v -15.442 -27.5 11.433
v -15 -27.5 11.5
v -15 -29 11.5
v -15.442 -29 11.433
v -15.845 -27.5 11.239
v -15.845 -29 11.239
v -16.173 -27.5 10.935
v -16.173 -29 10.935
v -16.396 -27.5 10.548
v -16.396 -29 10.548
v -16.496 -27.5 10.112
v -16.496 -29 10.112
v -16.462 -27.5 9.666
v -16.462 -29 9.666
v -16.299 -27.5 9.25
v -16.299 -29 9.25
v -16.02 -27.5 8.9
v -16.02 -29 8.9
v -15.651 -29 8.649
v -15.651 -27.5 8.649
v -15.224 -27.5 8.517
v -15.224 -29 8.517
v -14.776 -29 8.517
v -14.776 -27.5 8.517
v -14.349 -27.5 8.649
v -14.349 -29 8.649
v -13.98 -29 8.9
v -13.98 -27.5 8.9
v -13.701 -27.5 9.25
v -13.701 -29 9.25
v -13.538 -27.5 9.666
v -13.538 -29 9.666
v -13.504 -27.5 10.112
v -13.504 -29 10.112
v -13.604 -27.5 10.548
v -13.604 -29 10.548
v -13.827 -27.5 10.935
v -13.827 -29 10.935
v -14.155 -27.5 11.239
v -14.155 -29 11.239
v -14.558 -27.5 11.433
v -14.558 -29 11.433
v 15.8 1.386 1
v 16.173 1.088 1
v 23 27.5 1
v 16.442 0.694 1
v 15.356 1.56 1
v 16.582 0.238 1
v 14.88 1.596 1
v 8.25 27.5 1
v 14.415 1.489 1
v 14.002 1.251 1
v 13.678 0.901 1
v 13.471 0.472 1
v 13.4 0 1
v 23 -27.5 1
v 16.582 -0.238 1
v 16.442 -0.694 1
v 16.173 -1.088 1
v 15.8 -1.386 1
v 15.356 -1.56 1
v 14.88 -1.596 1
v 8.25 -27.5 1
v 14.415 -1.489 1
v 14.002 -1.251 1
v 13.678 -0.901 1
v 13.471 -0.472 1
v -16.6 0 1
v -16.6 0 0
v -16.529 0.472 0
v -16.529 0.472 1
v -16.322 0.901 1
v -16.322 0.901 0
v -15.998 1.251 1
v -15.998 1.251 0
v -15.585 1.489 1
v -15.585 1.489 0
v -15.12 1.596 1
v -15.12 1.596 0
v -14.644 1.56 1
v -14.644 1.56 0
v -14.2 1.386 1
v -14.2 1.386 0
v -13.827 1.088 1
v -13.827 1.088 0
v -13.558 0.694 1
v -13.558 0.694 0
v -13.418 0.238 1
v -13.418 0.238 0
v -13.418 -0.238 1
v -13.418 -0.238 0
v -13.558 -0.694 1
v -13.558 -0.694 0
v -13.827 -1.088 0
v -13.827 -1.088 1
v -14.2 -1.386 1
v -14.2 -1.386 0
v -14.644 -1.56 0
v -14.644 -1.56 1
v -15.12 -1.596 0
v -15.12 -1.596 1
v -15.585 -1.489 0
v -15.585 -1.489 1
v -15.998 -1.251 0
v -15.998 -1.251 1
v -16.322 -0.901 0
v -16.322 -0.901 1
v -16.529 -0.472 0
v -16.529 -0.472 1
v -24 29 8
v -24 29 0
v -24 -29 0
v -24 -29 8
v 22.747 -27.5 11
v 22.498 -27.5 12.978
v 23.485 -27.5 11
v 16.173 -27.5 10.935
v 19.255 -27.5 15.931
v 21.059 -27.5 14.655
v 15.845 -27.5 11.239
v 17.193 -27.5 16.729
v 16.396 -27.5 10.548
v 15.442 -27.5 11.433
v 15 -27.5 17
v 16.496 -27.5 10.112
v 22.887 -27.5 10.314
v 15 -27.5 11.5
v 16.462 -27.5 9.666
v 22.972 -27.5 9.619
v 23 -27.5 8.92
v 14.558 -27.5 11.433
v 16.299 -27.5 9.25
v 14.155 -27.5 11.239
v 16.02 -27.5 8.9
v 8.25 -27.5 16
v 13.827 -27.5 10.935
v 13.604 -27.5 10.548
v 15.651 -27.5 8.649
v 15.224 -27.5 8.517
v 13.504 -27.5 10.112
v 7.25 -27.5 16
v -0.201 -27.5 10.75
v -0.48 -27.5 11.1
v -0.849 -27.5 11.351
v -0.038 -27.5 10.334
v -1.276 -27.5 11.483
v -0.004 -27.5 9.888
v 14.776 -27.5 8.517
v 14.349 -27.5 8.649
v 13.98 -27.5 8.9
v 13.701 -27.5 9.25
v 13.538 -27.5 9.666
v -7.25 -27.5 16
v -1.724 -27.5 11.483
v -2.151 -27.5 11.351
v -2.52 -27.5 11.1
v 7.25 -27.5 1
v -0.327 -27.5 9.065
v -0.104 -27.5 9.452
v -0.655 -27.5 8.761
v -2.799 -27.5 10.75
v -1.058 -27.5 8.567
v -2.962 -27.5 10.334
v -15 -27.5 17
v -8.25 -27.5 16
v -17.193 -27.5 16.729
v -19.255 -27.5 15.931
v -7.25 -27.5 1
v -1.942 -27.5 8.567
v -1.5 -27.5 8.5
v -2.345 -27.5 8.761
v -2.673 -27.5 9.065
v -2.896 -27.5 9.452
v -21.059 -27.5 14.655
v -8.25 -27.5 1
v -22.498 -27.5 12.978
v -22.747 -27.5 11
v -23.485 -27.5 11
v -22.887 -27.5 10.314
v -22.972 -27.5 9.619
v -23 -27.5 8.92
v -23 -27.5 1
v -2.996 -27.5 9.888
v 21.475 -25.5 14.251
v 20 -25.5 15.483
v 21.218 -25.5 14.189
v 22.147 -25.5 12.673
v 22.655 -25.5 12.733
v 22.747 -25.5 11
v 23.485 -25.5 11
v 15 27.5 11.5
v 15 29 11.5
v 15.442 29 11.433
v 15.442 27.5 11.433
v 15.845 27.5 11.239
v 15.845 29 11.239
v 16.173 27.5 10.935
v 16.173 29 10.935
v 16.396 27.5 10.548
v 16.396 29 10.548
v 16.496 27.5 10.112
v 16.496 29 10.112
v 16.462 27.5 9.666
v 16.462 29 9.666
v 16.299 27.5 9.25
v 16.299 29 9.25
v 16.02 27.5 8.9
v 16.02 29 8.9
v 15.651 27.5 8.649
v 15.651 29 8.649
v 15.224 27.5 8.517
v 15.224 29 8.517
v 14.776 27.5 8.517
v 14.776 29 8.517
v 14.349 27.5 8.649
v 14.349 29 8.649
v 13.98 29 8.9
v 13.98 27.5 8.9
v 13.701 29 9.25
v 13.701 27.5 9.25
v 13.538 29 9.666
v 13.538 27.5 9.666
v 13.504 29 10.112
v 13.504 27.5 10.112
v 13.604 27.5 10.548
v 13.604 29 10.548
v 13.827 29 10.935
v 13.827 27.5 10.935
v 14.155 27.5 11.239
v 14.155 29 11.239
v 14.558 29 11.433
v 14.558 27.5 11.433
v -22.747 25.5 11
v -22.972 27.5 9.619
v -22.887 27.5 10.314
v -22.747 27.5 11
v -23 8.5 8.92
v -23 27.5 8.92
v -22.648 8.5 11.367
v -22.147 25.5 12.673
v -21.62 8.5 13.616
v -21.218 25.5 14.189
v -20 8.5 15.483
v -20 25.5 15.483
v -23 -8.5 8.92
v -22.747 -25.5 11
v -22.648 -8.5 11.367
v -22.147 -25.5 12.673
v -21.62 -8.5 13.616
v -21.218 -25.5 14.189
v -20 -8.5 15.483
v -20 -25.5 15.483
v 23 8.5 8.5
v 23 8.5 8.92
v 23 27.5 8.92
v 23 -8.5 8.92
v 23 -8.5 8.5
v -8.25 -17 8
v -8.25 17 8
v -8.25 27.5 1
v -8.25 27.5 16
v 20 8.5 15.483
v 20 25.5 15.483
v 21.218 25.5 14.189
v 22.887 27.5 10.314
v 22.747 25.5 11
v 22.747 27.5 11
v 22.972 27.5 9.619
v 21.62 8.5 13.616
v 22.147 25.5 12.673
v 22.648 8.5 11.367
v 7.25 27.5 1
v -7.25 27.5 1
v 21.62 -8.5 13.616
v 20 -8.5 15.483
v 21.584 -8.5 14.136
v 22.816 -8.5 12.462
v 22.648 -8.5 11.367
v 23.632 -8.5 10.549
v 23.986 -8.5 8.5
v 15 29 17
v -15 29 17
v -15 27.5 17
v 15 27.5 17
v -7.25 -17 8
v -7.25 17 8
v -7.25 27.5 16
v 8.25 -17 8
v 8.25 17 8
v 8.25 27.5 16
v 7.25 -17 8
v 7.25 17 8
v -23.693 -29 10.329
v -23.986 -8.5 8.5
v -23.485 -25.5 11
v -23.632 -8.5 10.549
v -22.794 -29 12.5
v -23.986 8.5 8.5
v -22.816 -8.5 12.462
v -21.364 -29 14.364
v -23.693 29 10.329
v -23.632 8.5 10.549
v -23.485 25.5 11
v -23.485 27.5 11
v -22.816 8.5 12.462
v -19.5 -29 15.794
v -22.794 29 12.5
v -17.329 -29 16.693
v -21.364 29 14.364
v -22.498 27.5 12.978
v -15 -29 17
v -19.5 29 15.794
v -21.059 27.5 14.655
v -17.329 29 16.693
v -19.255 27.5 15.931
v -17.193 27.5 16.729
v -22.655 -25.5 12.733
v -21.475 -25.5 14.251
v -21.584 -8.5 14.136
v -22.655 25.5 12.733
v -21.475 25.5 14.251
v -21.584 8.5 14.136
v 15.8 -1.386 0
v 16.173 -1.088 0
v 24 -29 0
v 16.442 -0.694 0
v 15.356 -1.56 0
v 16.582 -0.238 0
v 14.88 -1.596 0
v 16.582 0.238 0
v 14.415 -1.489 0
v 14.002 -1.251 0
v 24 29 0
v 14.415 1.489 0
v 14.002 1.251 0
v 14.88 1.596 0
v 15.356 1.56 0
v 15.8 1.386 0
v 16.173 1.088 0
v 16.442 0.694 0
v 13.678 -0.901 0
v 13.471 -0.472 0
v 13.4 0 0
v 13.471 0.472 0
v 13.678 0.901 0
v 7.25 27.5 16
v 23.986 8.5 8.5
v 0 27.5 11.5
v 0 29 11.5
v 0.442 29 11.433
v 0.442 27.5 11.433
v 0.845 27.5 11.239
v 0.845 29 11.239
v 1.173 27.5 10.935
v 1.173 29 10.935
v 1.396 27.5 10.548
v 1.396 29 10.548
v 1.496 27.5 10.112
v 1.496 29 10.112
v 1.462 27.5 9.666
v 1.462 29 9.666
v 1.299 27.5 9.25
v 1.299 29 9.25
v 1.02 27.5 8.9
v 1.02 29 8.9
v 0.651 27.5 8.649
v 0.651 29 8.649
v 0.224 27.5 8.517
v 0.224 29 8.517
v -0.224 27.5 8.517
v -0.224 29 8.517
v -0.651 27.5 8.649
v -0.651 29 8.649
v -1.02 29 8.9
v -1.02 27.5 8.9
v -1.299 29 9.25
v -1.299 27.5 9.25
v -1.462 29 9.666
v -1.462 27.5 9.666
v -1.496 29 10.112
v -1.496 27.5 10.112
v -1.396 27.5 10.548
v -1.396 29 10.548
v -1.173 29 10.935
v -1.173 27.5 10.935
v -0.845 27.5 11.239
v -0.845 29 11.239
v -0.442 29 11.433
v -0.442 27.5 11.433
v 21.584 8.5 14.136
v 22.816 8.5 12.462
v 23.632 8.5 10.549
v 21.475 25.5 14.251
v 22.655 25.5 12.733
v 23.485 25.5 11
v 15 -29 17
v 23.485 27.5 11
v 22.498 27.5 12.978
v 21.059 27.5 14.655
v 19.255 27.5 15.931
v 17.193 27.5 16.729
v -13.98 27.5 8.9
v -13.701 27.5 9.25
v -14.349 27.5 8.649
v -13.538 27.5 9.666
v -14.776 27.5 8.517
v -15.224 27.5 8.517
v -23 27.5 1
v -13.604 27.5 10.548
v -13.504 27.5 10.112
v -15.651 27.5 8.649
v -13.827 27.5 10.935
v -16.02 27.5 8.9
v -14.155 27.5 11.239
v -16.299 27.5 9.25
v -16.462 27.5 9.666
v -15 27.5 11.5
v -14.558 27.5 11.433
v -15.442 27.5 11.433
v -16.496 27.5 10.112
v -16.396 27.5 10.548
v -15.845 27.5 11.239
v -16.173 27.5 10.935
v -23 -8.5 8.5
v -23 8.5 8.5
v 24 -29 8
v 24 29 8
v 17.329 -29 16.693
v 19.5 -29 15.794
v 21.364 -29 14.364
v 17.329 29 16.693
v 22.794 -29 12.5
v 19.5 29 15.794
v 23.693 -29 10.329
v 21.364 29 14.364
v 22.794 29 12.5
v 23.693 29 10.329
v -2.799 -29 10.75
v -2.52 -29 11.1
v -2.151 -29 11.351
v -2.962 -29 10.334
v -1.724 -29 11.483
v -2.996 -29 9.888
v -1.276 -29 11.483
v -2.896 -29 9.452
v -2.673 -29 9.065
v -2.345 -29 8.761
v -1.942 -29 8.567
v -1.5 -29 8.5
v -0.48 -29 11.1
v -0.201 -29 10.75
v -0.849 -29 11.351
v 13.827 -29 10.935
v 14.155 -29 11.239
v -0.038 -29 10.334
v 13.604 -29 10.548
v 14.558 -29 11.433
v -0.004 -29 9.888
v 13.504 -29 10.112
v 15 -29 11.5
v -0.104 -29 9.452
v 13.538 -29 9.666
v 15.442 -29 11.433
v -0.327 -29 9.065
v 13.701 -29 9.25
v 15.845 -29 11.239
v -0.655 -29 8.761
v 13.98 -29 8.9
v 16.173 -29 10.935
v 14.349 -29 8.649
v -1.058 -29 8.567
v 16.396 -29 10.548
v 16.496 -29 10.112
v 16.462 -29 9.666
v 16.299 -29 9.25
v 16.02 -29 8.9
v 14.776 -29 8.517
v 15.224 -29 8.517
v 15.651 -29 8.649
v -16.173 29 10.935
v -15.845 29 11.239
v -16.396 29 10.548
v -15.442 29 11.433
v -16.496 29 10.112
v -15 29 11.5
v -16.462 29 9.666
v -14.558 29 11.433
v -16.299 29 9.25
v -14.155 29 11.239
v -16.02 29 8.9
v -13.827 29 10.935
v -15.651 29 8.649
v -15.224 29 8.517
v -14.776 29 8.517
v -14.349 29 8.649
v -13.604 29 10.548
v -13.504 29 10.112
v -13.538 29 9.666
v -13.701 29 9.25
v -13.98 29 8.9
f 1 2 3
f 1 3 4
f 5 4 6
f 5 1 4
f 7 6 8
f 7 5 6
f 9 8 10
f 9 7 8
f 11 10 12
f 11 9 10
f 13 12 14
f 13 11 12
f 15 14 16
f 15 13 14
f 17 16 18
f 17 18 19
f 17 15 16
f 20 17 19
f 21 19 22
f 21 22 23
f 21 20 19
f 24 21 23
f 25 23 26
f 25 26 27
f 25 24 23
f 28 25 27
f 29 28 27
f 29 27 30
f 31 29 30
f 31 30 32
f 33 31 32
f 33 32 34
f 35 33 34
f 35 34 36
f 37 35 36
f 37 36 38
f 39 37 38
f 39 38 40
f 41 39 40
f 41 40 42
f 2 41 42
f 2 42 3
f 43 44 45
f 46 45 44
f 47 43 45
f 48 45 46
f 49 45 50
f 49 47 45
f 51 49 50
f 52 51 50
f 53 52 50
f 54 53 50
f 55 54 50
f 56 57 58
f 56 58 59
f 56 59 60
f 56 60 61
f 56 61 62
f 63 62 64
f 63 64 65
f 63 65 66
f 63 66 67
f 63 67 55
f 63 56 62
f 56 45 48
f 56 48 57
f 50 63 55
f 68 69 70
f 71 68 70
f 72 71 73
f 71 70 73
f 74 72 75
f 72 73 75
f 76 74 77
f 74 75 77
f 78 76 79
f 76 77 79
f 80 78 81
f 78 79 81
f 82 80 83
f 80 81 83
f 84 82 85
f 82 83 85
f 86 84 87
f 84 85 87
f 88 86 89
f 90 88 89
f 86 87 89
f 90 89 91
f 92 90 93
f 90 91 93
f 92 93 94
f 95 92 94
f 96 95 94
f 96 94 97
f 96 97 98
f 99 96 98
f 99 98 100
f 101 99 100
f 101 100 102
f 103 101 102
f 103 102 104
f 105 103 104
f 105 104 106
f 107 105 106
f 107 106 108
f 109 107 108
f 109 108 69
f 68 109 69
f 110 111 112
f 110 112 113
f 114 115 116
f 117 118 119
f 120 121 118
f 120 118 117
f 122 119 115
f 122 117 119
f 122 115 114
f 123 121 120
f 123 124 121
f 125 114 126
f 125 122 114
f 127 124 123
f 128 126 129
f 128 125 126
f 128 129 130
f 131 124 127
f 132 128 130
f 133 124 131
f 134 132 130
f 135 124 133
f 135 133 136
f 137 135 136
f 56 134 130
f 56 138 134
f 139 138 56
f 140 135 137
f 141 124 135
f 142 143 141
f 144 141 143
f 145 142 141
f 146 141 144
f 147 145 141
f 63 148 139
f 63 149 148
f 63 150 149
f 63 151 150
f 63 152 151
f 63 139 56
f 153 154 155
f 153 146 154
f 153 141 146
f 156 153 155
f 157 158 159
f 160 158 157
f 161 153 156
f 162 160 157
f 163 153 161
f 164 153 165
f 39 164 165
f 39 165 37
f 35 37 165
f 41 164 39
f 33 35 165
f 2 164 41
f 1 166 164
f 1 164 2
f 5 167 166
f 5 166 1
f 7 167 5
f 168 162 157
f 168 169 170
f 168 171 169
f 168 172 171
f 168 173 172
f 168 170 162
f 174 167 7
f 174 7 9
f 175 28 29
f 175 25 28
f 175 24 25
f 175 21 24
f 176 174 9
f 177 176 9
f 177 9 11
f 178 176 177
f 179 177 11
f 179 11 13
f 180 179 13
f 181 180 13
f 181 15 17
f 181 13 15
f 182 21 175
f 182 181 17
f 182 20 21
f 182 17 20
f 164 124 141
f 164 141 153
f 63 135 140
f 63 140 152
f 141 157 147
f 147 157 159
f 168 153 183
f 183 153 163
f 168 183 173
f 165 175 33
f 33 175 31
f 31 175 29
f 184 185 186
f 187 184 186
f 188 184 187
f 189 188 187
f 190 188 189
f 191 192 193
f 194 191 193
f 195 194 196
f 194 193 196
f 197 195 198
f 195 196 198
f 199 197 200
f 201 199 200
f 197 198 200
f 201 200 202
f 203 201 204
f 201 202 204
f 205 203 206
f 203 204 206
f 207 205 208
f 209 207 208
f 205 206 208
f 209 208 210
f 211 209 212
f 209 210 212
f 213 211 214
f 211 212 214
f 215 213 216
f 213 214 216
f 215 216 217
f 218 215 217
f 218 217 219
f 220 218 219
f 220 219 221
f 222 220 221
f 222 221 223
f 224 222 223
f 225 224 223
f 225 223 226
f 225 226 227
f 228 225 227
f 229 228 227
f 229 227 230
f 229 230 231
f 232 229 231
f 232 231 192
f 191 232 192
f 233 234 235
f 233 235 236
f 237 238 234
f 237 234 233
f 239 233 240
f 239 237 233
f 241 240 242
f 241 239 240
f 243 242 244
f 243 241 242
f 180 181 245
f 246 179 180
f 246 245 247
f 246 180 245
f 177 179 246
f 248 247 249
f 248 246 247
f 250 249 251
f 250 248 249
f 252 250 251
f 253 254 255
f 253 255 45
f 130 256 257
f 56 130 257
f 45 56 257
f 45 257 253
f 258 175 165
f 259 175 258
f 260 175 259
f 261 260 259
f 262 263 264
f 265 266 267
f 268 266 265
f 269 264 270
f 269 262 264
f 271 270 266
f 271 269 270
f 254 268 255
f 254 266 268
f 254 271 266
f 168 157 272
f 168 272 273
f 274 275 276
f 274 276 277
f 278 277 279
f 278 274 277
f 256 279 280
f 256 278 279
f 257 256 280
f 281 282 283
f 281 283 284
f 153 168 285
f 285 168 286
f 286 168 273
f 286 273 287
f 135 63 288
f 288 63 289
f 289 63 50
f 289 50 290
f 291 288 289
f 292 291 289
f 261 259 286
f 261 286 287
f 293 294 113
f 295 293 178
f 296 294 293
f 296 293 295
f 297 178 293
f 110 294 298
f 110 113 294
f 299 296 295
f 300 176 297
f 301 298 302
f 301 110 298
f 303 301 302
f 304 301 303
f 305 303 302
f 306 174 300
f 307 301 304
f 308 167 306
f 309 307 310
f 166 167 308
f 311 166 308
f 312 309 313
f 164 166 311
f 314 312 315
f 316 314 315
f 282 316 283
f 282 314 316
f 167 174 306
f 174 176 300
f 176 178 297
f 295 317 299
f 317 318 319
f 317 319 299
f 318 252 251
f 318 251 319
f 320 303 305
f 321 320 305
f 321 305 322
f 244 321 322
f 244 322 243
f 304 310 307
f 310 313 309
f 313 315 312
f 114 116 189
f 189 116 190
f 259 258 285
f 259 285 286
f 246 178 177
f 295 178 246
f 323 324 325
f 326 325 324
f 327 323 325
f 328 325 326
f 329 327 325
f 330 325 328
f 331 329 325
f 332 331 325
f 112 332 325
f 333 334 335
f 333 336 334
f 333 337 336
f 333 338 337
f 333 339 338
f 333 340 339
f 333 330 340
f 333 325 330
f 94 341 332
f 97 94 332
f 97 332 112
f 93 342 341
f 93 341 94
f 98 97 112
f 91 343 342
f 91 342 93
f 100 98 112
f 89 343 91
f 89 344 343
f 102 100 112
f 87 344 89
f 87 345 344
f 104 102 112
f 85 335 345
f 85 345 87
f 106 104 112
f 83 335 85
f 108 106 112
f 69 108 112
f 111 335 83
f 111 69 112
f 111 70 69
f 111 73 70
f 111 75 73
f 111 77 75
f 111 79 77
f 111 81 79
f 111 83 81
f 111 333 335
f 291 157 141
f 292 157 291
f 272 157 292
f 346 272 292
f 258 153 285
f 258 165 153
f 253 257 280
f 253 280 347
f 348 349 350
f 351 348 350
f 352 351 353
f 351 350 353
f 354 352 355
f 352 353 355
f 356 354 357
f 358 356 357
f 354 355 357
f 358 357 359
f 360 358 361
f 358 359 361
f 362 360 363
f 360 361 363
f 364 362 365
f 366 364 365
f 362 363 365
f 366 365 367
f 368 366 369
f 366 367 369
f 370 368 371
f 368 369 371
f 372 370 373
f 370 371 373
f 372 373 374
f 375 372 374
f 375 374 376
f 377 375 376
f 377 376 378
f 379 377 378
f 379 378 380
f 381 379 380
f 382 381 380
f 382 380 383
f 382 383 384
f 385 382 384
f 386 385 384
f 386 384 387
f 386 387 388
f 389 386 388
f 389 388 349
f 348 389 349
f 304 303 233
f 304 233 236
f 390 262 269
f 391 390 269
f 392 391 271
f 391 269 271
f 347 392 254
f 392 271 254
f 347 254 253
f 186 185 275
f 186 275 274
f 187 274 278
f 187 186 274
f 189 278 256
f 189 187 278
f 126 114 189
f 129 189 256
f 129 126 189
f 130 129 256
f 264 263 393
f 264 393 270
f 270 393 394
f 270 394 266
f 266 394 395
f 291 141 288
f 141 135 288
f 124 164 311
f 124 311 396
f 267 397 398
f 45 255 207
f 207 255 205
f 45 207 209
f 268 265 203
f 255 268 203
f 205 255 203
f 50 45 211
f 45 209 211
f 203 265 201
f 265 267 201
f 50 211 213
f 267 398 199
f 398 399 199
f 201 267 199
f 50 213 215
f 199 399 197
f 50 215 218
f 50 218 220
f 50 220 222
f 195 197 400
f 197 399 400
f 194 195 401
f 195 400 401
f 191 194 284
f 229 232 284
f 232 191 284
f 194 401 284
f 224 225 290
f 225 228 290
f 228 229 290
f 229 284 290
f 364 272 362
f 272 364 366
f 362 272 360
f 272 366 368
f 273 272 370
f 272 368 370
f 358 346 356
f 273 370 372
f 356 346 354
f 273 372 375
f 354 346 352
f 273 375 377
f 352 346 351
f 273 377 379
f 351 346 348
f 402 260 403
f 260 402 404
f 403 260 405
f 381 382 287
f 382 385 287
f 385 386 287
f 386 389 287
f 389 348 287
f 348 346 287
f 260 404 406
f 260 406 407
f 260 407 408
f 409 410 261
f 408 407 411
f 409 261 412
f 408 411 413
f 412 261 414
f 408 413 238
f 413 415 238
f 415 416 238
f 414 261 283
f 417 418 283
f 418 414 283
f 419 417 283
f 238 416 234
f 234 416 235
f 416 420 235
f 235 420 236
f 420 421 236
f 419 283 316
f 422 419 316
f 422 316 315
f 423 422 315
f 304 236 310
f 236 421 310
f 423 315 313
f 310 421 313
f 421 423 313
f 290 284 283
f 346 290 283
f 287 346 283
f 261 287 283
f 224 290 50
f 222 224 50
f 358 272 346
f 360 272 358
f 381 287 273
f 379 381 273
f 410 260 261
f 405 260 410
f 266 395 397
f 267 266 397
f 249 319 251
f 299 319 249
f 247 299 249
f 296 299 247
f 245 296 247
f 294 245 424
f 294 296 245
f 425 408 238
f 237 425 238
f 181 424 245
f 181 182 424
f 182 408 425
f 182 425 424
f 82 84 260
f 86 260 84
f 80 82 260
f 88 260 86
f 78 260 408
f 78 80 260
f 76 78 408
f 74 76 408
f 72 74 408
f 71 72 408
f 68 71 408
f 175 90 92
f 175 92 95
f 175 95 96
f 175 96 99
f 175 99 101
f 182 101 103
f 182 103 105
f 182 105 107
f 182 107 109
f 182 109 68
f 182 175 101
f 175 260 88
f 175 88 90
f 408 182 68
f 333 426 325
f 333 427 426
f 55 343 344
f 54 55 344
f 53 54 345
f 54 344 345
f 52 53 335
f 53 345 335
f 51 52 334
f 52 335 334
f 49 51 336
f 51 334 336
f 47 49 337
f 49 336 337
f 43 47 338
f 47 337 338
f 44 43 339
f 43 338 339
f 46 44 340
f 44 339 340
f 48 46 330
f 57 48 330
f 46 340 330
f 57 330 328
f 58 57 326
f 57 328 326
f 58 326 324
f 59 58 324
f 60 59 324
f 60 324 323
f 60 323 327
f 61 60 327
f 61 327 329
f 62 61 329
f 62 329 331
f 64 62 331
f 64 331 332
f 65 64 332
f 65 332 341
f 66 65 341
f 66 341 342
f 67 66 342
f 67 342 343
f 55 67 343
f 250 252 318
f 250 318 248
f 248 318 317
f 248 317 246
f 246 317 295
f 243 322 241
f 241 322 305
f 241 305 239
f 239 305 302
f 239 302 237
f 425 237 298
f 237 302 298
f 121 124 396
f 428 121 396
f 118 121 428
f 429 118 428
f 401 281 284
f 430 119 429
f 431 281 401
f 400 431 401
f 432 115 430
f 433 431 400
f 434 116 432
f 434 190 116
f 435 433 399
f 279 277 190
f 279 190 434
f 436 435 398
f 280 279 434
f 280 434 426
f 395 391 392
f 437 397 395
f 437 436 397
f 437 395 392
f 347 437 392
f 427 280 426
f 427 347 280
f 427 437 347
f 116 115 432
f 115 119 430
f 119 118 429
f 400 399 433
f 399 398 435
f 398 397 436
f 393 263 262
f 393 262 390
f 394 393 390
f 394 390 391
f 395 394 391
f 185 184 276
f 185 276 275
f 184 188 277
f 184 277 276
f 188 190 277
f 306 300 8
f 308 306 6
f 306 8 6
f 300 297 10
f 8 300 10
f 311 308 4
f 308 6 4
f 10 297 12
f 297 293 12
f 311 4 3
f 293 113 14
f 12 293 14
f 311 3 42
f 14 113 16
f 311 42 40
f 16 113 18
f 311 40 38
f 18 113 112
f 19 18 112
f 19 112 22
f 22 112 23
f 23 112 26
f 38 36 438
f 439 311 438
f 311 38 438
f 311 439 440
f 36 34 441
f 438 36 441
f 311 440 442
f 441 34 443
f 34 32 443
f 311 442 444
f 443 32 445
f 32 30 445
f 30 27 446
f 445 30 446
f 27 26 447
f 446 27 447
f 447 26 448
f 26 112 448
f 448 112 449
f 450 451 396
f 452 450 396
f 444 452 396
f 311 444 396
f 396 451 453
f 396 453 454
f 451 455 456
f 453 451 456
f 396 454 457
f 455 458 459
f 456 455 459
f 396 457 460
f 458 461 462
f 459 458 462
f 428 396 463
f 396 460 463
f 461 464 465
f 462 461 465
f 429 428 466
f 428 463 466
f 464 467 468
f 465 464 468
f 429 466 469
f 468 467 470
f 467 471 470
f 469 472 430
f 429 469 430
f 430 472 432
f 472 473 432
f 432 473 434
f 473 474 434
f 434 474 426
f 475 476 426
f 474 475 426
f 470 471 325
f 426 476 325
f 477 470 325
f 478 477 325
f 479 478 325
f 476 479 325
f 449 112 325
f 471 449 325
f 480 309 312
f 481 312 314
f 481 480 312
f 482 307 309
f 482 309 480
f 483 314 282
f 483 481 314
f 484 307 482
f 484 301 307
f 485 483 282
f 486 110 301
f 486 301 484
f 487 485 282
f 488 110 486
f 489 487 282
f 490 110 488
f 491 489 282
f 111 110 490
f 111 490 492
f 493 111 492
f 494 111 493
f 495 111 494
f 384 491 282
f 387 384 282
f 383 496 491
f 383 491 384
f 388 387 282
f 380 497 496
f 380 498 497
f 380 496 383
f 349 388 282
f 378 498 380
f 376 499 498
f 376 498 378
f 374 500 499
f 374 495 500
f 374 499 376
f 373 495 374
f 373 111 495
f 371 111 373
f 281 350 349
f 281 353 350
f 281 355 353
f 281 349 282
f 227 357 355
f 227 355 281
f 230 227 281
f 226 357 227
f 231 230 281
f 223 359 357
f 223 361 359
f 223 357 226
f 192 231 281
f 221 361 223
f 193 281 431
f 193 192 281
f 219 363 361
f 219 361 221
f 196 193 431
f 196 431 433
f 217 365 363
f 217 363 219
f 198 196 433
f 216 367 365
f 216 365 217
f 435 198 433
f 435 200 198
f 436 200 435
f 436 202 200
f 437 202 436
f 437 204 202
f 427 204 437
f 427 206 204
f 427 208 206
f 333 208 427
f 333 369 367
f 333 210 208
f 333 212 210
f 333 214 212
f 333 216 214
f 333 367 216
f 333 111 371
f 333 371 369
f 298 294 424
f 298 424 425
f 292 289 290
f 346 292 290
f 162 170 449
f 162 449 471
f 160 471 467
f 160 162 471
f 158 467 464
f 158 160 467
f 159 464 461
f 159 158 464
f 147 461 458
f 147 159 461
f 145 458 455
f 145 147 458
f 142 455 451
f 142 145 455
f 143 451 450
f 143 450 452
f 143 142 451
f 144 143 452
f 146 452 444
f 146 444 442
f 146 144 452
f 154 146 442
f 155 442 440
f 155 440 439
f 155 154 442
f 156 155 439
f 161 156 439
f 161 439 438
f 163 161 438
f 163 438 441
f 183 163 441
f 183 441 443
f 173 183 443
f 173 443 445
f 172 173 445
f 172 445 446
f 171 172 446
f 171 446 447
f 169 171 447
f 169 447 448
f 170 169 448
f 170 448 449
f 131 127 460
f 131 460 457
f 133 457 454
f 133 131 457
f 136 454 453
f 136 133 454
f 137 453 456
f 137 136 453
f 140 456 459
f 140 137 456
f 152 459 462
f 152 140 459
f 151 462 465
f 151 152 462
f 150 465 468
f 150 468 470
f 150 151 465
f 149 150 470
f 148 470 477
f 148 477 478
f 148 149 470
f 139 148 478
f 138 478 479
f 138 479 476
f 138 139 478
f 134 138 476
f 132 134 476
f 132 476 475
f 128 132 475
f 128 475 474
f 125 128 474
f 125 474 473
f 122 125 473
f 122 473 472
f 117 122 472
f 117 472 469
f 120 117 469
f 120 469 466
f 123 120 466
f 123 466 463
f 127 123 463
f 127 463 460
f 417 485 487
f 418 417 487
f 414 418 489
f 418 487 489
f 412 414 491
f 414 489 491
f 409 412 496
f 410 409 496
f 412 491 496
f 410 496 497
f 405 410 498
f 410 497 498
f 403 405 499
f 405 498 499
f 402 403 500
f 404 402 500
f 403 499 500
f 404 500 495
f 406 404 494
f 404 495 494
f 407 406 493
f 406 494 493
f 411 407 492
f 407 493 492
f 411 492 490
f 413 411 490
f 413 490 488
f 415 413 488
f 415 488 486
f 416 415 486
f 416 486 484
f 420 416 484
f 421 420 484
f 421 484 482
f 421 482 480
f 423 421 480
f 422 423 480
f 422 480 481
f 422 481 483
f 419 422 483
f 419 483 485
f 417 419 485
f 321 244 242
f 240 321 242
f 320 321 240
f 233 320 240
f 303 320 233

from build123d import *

# Parameters (mm, degrees)
BOSS_EXTRUDE1_DEPTH     = 29
CUT_EXTRUDE1_START      = -1.5
CUT_EXTRUDE1_DEPTH      = 55
BOSS_EXTRUDE2_DEPTH     = 0.5
CUT_EXTRUDE2_DEPTH      = 42.303752856
CUT_EXTRUDE2_DEPTH_BACK = 42.303752856
SKETCH5_W               = 8.5
SKETCH5_H               = 17
SKETCH6_W               = 6
SKETCH6_H               = 2
CUT_EXTRUDE3_DEPTH      = 10
SKETCH7_R               = 1.5
CUT_EXTRUDE4_DEPTH      = 10
CUT_EXTRUDE5_START      = -10
SKETCH8_R               = 1.5
CUT_EXTRUDE5_DEPTH      = 10
SKETCH9_R               = 1.6
CUT_EXTRUDE6_DEPTH      = 42.303752856


with BuildPart() as part:
    # Sketch2 → Boss-Extrude1 (new, symmetric)
    with BuildSketch(Plane(origin=(0, 0, 0), x_dir=(1, 0, 0), z_dir=(0, 1, 0))):
        with BuildLine():
            Line((24, 0), (-24, 0))
            Line((-24, 0), (-24, -8))
            ThreePointArc((-24, -8), (-21.363961031, -14.363961031), (-15, -17))
            Line((-15, -17), (15, -17))
            ThreePointArc((15, -17), (21.363961031, -14.363961031), (24, -8))
            Line((24, -8), (24, 0))
        make_face()
    extrude(amount=BOSS_EXTRUDE1_DEPTH, both=True)

    # Sketch3 → Cut-Extrude1 (cut)
    with BuildSketch(Plane.XZ.offset(29).offset(CUT_EXTRUDE1_START)):
        with BuildLine():
            Line((-14.319593213, 17.6), (14.319593213, 17.6))
            ThreePointArc((14.319593213, 17.6), (20.457567716, 15.057567716), (23, 8.919593213))
            Line((23, 8.919593213), (23, 1))
            Line((23, 1), (-23, 1))
            Line((-23, 1), (-23, 8.919593213))
            ThreePointArc((-23, 8.919593213), (-20.457567716, 15.057567716), (-14.319593213, 17.6))
        make_face()
    extrude(amount=-CUT_EXTRUDE1_DEPTH, mode=Mode.SUBTRACT)

    # Sketch4 → Boss-Extrude2 (add, symmetric)
    with BuildSketch(Plane(origin=(7.75, 0, 0), x_dir=(0, 0, -1), z_dir=(1, 0, 0))):
        Polygon((-16, 27.5), (-1, 27.5), (-1, -27.5), (-16, -27.5), (-8, -17), (-8, 17), align=None)
    boss_extrude2 = extrude(amount=BOSS_EXTRUDE2_DEPTH, both=True)

    # Mirror1: Boss-Extrude2 across plane
    add(boss_extrude2.mirror(Plane(origin=(0, 0, 0), x_dir=(0, 0, 1), z_dir=(1, 0, 0))))

    # Sketch5 → Cut-Extrude2 (cut, two sides: drawn at the far end of the back side and taken through both)
    with BuildSketch(Plane(origin=(0, 0, 0), x_dir=(0, 0, -1), z_dir=(1, 0, 0)).offset(-CUT_EXTRUDE2_DEPTH_BACK)):
        with Locations((-12.75, 0)):
            Rectangle(SKETCH5_W, SKETCH5_H)
    extrude(amount=CUT_EXTRUDE2_DEPTH + CUT_EXTRUDE2_DEPTH_BACK, mode=Mode.SUBTRACT)

    # Sketch6 → Cut-Extrude3 (cut)
    with BuildSketch(Plane(origin=(24, 0, 0), x_dir=(0, 0, -1), z_dir=(1, 0, 0))):
        with Locations((-14, 26.5)):
            Rectangle(SKETCH6_W, SKETCH6_H)
        with Locations((-14, -26.5)):
            Rectangle(SKETCH6_W, SKETCH6_H)
    cut_extrude3 = extrude(amount=-CUT_EXTRUDE3_DEPTH, mode=Mode.SUBTRACT)

    # Mirror2: Cut-Extrude3 across plane
    add(cut_extrude3.mirror(Plane(origin=(0, 0, 0), x_dir=(0, 0, 1), z_dir=(1, 0, 0))), mode=Mode.SUBTRACT)

    # Sketch7 → Cut-Extrude4 (cut)
    with BuildSketch(Plane(origin=(0, 29, 0), x_dir=(1, 0, 0), z_dir=(0, 1, 0))):
        with Locations(Location((-15, -10, 0), (0, 0, 270))):
            Circle(SKETCH7_R)
        with Locations(Location((0, -10, 0), (0, 0, 270))):
            Circle(SKETCH7_R)
        with Locations(Location((15, -10, 0), (0, 0, 270))):
            Circle(SKETCH7_R)
    extrude(amount=-CUT_EXTRUDE4_DEPTH, mode=Mode.SUBTRACT)

    # Sketch8 → Cut-Extrude5 (cut)
    with BuildSketch(Plane.XZ.offset(29).offset(CUT_EXTRUDE5_START)):
        with Locations(Location((-15, 10, 0), (0, 0, 90))):
            Circle(SKETCH8_R)
        with Locations(Location((15, 10, 0), (0, 0, 90))):
            Circle(SKETCH8_R)
        with Locations(Location((-1.5, 10, 0), (0, 0, 270))):
            Circle(SKETCH8_R)
    extrude(amount=CUT_EXTRUDE5_DEPTH, mode=Mode.SUBTRACT)

    # Sketch9 → Cut-Extrude6 (cut, through all)
    with BuildSketch(Plane(origin=(0, 0, 0), x_dir=(-1, 0, 0), z_dir=(0, 0, -1))):
        with Locations((-15, 0)):
            Circle(SKETCH9_R)
        with Locations((15, 0)):
            Circle(SKETCH9_R)
    extrude(amount=-CUT_EXTRUDE6_DEPTH, mode=Mode.SUBTRACT)


solid = part.part
